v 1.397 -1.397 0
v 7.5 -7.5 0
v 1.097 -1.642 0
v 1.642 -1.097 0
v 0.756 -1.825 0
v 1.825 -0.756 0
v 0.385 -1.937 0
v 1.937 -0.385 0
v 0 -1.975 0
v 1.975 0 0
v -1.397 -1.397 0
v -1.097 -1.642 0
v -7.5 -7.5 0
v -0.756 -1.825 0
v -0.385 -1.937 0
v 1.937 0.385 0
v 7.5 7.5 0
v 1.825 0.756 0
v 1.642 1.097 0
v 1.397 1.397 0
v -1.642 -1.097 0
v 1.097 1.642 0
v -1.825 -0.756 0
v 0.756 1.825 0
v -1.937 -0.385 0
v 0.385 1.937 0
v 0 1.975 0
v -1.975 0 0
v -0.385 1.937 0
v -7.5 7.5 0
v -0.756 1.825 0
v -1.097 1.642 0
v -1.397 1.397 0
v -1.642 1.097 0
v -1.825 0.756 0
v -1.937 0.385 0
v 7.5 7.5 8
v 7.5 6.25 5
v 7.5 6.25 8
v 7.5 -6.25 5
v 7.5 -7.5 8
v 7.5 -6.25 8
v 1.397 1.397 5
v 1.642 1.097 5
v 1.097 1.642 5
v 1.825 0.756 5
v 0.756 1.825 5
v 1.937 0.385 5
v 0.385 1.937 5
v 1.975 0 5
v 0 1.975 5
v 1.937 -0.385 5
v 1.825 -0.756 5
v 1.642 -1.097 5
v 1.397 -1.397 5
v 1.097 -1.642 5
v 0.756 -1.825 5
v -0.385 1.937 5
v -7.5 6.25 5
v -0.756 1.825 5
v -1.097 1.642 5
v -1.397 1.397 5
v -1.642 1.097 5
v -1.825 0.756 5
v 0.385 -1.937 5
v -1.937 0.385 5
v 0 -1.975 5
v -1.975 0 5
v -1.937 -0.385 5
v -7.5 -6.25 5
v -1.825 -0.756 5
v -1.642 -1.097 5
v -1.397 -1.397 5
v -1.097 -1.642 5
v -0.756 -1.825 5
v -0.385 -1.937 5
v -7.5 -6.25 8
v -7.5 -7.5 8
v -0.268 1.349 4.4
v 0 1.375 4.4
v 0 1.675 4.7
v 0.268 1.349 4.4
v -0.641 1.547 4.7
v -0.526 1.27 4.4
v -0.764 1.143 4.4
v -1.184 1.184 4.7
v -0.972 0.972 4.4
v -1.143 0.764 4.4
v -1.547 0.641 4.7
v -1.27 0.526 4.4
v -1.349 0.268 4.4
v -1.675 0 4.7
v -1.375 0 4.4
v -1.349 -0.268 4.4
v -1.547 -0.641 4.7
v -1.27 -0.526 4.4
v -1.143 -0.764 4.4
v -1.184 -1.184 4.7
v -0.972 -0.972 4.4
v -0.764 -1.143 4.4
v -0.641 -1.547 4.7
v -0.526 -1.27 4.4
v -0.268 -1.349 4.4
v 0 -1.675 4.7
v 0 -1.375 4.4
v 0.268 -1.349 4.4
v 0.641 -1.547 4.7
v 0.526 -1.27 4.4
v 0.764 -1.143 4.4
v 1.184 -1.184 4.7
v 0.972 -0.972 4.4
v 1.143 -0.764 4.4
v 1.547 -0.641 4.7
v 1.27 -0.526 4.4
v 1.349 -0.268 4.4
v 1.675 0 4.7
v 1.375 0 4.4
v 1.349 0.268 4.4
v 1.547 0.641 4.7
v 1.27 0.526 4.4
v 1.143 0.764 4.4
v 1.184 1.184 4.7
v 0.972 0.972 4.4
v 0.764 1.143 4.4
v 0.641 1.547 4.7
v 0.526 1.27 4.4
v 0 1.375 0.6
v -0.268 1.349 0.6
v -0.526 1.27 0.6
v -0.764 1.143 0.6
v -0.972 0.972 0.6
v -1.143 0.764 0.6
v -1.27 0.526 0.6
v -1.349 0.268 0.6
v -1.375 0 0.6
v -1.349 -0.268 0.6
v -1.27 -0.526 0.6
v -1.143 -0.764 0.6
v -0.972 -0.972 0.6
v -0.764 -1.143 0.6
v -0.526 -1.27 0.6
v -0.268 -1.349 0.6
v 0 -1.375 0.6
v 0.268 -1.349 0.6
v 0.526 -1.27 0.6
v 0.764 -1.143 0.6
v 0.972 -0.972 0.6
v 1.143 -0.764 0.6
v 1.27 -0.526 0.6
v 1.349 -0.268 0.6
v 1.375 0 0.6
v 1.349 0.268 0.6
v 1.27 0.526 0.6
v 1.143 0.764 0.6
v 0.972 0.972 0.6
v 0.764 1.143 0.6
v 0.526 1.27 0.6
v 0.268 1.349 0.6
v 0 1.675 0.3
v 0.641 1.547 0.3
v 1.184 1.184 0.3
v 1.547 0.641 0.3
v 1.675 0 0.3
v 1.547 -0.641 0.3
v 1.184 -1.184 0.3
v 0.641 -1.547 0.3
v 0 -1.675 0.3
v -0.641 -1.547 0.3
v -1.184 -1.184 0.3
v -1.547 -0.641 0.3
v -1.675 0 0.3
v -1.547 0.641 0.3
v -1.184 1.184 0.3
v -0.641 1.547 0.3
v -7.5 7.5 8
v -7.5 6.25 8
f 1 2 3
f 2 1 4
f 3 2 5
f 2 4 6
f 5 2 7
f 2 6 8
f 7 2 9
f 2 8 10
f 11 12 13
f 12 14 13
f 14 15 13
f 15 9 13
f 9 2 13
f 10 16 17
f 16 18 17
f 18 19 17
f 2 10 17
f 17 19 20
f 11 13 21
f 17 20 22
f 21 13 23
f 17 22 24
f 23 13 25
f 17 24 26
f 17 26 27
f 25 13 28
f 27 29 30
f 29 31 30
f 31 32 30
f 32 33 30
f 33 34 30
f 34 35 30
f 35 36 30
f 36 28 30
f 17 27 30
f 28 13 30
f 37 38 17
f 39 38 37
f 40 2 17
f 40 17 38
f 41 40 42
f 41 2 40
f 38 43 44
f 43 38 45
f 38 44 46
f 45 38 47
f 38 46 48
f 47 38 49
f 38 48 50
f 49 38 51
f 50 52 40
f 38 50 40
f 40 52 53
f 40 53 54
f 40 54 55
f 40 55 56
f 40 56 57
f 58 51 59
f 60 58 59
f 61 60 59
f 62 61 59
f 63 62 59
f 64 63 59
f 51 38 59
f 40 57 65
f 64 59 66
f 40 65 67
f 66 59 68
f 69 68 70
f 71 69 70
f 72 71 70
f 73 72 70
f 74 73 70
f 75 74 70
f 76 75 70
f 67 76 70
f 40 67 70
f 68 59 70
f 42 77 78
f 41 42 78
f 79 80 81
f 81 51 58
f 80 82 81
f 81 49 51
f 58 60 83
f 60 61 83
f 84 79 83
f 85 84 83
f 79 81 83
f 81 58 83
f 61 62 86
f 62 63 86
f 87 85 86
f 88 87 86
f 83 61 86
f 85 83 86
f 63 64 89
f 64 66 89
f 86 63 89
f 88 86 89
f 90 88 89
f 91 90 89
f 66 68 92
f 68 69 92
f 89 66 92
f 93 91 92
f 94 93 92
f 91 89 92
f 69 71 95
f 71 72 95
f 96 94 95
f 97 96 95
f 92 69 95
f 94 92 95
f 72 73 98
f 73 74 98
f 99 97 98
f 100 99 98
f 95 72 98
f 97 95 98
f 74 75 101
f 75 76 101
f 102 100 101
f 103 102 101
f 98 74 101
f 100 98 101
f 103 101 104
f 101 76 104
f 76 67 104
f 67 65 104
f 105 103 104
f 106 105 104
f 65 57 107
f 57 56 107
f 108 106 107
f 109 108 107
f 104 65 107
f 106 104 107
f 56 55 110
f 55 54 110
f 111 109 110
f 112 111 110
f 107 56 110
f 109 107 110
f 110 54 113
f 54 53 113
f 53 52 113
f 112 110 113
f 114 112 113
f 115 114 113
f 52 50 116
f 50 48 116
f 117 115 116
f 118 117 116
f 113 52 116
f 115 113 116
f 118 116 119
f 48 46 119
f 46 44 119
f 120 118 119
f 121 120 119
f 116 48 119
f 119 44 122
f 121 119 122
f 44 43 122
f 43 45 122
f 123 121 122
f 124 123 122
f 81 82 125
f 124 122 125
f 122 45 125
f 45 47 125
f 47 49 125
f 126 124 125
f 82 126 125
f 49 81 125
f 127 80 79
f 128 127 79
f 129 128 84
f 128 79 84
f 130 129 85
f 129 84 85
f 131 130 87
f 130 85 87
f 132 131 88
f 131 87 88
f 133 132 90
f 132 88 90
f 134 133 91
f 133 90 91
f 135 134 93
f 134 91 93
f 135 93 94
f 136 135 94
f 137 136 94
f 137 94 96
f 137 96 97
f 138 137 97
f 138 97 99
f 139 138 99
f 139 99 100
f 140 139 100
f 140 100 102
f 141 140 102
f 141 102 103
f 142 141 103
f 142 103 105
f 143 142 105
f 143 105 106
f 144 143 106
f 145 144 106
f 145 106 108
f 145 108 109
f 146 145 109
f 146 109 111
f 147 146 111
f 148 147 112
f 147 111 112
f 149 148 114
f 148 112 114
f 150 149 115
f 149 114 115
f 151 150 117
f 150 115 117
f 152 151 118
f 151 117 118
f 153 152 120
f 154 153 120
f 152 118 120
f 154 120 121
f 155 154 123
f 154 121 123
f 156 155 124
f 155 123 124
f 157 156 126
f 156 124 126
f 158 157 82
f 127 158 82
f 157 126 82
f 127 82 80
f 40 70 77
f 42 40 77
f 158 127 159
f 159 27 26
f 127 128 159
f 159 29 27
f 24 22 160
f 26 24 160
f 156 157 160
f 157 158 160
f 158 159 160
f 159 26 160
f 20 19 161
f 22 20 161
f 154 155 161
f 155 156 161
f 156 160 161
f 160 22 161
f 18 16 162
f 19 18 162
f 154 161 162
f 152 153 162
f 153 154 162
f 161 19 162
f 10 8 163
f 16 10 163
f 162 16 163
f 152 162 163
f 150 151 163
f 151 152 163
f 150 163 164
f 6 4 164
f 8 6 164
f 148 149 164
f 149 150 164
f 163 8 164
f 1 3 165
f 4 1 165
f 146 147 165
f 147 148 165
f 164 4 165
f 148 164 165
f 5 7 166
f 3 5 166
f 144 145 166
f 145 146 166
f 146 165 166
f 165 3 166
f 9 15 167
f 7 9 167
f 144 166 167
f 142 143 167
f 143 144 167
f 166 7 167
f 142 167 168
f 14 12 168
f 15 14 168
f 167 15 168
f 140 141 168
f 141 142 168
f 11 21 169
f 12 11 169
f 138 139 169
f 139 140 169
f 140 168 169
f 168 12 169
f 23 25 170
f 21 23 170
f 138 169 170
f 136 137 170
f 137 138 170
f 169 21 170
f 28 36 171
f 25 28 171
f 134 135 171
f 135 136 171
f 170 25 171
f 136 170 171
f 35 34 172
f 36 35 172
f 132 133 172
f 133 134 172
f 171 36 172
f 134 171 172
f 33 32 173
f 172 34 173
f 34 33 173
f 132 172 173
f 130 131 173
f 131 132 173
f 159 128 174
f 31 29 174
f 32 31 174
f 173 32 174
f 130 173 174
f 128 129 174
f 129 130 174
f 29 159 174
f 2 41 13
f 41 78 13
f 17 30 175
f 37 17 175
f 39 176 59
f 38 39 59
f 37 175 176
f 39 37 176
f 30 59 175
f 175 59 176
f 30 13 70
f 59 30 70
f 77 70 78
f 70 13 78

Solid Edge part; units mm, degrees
sketch "Sketch1" plane through (0, 0, 0) normal (1, 0, 0) x (0, 1, 0)
  line L0 (-7.5, 8) -> (-7.5, 0)
  line L1 (-7.5, 0) -> (7.5, 0)
  line L2 (7.5, 0) -> (7.5, 8)
  line L3 (7.5, 8) -> (6.25, 8)
  line L4 (6.25, 8) -> (6.25, 5)
  line L5 (6.25, 5) -> (-6.25, 5)
  line L6 (-6.25, 5) -> (-6.25, 8)
  line L7 (-6.25, 8) -> (-7.5, 8)
  dimension "D1" = 12.5
  dimension "D2" = 15
  dimension "D3" = 8
  dimension "D4" = 3
extrude "Protrusion1" add sketch "Sketch1" along normal mid plane 15
hole "screw_hole" at (0, 0, 0) direction (0, 0, 1) diameter 2.75 depth 30 tip angle 118 start chamfer 0.6 start chamfer angle 45 end chamfer 0.6 end chamfer angle 45
properties material "Polyethylene, low density"
